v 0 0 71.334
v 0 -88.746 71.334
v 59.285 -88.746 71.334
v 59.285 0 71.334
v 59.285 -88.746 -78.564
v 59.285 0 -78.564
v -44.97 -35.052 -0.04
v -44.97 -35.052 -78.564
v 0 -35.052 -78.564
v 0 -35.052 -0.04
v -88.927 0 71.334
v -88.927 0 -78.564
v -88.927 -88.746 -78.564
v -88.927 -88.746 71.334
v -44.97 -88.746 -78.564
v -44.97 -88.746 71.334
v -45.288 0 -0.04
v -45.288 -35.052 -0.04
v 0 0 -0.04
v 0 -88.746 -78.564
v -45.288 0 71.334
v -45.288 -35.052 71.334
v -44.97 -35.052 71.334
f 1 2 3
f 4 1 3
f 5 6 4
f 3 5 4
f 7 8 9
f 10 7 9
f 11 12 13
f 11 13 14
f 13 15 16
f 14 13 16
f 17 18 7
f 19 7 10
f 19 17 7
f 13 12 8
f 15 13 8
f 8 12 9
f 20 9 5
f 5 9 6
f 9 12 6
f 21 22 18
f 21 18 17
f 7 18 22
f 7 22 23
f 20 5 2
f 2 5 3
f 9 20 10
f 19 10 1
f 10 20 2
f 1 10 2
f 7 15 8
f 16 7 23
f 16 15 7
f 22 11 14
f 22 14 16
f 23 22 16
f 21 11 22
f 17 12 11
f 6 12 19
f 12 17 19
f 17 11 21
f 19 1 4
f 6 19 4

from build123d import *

# Parameters (mm, degrees)
F0_W     = 148.2112929225
F0_H     = 149.8982533813
F1_DEPTH = 144.78
F2_W     = 44.9698530138
F2_H     = 149.8982533813
F3_DEPTH = 109.728
F4_W     = 45.2879443765
F4_H     = 35.052
F5_DEPTH = 71.374
F6_W     = 56.0343910742
F6_H     = 149.8982533813
F7_DEPTH = 158.75


with BuildPart() as f1:
    # F0 (on Front) → F1 (new body)
    with BuildSketch(Plane.XZ):
        with Locations((-14.8211307824, -3.6149062216)):
            Rectangle(F0_W, F0_H)
    extrude(amount=F1_DEPTH)

    # F2 (on face) → F3 (cut)
    with BuildSketch(Plane.XZ.offset(144.78)):
        with Locations((-22.4849265069, -3.6149062216)):
            Rectangle(F2_W, F2_H)
    extrude(amount=-F3_DEPTH, mode=Mode.SUBTRACT)

    # F4 (on face) → F5 (cut)
    with BuildSketch(Plane.XY.offset(71.334220469)):
        with Locations((-22.6439721882, -17.526)):
            Rectangle(F4_W, F4_H)
    extrude(amount=-F5_DEPTH, mode=Mode.SUBTRACT)

    # F6 (on face) → F7 (cut)
    with BuildSketch(Plane.YZ.offset(59.2845156789)):
        with Locations((-116.7628044629, -3.6149062216)):
            Rectangle(F6_W, F6_H)
    extrude(amount=-F7_DEPTH, mode=Mode.SUBTRACT)


solid = f1.part
